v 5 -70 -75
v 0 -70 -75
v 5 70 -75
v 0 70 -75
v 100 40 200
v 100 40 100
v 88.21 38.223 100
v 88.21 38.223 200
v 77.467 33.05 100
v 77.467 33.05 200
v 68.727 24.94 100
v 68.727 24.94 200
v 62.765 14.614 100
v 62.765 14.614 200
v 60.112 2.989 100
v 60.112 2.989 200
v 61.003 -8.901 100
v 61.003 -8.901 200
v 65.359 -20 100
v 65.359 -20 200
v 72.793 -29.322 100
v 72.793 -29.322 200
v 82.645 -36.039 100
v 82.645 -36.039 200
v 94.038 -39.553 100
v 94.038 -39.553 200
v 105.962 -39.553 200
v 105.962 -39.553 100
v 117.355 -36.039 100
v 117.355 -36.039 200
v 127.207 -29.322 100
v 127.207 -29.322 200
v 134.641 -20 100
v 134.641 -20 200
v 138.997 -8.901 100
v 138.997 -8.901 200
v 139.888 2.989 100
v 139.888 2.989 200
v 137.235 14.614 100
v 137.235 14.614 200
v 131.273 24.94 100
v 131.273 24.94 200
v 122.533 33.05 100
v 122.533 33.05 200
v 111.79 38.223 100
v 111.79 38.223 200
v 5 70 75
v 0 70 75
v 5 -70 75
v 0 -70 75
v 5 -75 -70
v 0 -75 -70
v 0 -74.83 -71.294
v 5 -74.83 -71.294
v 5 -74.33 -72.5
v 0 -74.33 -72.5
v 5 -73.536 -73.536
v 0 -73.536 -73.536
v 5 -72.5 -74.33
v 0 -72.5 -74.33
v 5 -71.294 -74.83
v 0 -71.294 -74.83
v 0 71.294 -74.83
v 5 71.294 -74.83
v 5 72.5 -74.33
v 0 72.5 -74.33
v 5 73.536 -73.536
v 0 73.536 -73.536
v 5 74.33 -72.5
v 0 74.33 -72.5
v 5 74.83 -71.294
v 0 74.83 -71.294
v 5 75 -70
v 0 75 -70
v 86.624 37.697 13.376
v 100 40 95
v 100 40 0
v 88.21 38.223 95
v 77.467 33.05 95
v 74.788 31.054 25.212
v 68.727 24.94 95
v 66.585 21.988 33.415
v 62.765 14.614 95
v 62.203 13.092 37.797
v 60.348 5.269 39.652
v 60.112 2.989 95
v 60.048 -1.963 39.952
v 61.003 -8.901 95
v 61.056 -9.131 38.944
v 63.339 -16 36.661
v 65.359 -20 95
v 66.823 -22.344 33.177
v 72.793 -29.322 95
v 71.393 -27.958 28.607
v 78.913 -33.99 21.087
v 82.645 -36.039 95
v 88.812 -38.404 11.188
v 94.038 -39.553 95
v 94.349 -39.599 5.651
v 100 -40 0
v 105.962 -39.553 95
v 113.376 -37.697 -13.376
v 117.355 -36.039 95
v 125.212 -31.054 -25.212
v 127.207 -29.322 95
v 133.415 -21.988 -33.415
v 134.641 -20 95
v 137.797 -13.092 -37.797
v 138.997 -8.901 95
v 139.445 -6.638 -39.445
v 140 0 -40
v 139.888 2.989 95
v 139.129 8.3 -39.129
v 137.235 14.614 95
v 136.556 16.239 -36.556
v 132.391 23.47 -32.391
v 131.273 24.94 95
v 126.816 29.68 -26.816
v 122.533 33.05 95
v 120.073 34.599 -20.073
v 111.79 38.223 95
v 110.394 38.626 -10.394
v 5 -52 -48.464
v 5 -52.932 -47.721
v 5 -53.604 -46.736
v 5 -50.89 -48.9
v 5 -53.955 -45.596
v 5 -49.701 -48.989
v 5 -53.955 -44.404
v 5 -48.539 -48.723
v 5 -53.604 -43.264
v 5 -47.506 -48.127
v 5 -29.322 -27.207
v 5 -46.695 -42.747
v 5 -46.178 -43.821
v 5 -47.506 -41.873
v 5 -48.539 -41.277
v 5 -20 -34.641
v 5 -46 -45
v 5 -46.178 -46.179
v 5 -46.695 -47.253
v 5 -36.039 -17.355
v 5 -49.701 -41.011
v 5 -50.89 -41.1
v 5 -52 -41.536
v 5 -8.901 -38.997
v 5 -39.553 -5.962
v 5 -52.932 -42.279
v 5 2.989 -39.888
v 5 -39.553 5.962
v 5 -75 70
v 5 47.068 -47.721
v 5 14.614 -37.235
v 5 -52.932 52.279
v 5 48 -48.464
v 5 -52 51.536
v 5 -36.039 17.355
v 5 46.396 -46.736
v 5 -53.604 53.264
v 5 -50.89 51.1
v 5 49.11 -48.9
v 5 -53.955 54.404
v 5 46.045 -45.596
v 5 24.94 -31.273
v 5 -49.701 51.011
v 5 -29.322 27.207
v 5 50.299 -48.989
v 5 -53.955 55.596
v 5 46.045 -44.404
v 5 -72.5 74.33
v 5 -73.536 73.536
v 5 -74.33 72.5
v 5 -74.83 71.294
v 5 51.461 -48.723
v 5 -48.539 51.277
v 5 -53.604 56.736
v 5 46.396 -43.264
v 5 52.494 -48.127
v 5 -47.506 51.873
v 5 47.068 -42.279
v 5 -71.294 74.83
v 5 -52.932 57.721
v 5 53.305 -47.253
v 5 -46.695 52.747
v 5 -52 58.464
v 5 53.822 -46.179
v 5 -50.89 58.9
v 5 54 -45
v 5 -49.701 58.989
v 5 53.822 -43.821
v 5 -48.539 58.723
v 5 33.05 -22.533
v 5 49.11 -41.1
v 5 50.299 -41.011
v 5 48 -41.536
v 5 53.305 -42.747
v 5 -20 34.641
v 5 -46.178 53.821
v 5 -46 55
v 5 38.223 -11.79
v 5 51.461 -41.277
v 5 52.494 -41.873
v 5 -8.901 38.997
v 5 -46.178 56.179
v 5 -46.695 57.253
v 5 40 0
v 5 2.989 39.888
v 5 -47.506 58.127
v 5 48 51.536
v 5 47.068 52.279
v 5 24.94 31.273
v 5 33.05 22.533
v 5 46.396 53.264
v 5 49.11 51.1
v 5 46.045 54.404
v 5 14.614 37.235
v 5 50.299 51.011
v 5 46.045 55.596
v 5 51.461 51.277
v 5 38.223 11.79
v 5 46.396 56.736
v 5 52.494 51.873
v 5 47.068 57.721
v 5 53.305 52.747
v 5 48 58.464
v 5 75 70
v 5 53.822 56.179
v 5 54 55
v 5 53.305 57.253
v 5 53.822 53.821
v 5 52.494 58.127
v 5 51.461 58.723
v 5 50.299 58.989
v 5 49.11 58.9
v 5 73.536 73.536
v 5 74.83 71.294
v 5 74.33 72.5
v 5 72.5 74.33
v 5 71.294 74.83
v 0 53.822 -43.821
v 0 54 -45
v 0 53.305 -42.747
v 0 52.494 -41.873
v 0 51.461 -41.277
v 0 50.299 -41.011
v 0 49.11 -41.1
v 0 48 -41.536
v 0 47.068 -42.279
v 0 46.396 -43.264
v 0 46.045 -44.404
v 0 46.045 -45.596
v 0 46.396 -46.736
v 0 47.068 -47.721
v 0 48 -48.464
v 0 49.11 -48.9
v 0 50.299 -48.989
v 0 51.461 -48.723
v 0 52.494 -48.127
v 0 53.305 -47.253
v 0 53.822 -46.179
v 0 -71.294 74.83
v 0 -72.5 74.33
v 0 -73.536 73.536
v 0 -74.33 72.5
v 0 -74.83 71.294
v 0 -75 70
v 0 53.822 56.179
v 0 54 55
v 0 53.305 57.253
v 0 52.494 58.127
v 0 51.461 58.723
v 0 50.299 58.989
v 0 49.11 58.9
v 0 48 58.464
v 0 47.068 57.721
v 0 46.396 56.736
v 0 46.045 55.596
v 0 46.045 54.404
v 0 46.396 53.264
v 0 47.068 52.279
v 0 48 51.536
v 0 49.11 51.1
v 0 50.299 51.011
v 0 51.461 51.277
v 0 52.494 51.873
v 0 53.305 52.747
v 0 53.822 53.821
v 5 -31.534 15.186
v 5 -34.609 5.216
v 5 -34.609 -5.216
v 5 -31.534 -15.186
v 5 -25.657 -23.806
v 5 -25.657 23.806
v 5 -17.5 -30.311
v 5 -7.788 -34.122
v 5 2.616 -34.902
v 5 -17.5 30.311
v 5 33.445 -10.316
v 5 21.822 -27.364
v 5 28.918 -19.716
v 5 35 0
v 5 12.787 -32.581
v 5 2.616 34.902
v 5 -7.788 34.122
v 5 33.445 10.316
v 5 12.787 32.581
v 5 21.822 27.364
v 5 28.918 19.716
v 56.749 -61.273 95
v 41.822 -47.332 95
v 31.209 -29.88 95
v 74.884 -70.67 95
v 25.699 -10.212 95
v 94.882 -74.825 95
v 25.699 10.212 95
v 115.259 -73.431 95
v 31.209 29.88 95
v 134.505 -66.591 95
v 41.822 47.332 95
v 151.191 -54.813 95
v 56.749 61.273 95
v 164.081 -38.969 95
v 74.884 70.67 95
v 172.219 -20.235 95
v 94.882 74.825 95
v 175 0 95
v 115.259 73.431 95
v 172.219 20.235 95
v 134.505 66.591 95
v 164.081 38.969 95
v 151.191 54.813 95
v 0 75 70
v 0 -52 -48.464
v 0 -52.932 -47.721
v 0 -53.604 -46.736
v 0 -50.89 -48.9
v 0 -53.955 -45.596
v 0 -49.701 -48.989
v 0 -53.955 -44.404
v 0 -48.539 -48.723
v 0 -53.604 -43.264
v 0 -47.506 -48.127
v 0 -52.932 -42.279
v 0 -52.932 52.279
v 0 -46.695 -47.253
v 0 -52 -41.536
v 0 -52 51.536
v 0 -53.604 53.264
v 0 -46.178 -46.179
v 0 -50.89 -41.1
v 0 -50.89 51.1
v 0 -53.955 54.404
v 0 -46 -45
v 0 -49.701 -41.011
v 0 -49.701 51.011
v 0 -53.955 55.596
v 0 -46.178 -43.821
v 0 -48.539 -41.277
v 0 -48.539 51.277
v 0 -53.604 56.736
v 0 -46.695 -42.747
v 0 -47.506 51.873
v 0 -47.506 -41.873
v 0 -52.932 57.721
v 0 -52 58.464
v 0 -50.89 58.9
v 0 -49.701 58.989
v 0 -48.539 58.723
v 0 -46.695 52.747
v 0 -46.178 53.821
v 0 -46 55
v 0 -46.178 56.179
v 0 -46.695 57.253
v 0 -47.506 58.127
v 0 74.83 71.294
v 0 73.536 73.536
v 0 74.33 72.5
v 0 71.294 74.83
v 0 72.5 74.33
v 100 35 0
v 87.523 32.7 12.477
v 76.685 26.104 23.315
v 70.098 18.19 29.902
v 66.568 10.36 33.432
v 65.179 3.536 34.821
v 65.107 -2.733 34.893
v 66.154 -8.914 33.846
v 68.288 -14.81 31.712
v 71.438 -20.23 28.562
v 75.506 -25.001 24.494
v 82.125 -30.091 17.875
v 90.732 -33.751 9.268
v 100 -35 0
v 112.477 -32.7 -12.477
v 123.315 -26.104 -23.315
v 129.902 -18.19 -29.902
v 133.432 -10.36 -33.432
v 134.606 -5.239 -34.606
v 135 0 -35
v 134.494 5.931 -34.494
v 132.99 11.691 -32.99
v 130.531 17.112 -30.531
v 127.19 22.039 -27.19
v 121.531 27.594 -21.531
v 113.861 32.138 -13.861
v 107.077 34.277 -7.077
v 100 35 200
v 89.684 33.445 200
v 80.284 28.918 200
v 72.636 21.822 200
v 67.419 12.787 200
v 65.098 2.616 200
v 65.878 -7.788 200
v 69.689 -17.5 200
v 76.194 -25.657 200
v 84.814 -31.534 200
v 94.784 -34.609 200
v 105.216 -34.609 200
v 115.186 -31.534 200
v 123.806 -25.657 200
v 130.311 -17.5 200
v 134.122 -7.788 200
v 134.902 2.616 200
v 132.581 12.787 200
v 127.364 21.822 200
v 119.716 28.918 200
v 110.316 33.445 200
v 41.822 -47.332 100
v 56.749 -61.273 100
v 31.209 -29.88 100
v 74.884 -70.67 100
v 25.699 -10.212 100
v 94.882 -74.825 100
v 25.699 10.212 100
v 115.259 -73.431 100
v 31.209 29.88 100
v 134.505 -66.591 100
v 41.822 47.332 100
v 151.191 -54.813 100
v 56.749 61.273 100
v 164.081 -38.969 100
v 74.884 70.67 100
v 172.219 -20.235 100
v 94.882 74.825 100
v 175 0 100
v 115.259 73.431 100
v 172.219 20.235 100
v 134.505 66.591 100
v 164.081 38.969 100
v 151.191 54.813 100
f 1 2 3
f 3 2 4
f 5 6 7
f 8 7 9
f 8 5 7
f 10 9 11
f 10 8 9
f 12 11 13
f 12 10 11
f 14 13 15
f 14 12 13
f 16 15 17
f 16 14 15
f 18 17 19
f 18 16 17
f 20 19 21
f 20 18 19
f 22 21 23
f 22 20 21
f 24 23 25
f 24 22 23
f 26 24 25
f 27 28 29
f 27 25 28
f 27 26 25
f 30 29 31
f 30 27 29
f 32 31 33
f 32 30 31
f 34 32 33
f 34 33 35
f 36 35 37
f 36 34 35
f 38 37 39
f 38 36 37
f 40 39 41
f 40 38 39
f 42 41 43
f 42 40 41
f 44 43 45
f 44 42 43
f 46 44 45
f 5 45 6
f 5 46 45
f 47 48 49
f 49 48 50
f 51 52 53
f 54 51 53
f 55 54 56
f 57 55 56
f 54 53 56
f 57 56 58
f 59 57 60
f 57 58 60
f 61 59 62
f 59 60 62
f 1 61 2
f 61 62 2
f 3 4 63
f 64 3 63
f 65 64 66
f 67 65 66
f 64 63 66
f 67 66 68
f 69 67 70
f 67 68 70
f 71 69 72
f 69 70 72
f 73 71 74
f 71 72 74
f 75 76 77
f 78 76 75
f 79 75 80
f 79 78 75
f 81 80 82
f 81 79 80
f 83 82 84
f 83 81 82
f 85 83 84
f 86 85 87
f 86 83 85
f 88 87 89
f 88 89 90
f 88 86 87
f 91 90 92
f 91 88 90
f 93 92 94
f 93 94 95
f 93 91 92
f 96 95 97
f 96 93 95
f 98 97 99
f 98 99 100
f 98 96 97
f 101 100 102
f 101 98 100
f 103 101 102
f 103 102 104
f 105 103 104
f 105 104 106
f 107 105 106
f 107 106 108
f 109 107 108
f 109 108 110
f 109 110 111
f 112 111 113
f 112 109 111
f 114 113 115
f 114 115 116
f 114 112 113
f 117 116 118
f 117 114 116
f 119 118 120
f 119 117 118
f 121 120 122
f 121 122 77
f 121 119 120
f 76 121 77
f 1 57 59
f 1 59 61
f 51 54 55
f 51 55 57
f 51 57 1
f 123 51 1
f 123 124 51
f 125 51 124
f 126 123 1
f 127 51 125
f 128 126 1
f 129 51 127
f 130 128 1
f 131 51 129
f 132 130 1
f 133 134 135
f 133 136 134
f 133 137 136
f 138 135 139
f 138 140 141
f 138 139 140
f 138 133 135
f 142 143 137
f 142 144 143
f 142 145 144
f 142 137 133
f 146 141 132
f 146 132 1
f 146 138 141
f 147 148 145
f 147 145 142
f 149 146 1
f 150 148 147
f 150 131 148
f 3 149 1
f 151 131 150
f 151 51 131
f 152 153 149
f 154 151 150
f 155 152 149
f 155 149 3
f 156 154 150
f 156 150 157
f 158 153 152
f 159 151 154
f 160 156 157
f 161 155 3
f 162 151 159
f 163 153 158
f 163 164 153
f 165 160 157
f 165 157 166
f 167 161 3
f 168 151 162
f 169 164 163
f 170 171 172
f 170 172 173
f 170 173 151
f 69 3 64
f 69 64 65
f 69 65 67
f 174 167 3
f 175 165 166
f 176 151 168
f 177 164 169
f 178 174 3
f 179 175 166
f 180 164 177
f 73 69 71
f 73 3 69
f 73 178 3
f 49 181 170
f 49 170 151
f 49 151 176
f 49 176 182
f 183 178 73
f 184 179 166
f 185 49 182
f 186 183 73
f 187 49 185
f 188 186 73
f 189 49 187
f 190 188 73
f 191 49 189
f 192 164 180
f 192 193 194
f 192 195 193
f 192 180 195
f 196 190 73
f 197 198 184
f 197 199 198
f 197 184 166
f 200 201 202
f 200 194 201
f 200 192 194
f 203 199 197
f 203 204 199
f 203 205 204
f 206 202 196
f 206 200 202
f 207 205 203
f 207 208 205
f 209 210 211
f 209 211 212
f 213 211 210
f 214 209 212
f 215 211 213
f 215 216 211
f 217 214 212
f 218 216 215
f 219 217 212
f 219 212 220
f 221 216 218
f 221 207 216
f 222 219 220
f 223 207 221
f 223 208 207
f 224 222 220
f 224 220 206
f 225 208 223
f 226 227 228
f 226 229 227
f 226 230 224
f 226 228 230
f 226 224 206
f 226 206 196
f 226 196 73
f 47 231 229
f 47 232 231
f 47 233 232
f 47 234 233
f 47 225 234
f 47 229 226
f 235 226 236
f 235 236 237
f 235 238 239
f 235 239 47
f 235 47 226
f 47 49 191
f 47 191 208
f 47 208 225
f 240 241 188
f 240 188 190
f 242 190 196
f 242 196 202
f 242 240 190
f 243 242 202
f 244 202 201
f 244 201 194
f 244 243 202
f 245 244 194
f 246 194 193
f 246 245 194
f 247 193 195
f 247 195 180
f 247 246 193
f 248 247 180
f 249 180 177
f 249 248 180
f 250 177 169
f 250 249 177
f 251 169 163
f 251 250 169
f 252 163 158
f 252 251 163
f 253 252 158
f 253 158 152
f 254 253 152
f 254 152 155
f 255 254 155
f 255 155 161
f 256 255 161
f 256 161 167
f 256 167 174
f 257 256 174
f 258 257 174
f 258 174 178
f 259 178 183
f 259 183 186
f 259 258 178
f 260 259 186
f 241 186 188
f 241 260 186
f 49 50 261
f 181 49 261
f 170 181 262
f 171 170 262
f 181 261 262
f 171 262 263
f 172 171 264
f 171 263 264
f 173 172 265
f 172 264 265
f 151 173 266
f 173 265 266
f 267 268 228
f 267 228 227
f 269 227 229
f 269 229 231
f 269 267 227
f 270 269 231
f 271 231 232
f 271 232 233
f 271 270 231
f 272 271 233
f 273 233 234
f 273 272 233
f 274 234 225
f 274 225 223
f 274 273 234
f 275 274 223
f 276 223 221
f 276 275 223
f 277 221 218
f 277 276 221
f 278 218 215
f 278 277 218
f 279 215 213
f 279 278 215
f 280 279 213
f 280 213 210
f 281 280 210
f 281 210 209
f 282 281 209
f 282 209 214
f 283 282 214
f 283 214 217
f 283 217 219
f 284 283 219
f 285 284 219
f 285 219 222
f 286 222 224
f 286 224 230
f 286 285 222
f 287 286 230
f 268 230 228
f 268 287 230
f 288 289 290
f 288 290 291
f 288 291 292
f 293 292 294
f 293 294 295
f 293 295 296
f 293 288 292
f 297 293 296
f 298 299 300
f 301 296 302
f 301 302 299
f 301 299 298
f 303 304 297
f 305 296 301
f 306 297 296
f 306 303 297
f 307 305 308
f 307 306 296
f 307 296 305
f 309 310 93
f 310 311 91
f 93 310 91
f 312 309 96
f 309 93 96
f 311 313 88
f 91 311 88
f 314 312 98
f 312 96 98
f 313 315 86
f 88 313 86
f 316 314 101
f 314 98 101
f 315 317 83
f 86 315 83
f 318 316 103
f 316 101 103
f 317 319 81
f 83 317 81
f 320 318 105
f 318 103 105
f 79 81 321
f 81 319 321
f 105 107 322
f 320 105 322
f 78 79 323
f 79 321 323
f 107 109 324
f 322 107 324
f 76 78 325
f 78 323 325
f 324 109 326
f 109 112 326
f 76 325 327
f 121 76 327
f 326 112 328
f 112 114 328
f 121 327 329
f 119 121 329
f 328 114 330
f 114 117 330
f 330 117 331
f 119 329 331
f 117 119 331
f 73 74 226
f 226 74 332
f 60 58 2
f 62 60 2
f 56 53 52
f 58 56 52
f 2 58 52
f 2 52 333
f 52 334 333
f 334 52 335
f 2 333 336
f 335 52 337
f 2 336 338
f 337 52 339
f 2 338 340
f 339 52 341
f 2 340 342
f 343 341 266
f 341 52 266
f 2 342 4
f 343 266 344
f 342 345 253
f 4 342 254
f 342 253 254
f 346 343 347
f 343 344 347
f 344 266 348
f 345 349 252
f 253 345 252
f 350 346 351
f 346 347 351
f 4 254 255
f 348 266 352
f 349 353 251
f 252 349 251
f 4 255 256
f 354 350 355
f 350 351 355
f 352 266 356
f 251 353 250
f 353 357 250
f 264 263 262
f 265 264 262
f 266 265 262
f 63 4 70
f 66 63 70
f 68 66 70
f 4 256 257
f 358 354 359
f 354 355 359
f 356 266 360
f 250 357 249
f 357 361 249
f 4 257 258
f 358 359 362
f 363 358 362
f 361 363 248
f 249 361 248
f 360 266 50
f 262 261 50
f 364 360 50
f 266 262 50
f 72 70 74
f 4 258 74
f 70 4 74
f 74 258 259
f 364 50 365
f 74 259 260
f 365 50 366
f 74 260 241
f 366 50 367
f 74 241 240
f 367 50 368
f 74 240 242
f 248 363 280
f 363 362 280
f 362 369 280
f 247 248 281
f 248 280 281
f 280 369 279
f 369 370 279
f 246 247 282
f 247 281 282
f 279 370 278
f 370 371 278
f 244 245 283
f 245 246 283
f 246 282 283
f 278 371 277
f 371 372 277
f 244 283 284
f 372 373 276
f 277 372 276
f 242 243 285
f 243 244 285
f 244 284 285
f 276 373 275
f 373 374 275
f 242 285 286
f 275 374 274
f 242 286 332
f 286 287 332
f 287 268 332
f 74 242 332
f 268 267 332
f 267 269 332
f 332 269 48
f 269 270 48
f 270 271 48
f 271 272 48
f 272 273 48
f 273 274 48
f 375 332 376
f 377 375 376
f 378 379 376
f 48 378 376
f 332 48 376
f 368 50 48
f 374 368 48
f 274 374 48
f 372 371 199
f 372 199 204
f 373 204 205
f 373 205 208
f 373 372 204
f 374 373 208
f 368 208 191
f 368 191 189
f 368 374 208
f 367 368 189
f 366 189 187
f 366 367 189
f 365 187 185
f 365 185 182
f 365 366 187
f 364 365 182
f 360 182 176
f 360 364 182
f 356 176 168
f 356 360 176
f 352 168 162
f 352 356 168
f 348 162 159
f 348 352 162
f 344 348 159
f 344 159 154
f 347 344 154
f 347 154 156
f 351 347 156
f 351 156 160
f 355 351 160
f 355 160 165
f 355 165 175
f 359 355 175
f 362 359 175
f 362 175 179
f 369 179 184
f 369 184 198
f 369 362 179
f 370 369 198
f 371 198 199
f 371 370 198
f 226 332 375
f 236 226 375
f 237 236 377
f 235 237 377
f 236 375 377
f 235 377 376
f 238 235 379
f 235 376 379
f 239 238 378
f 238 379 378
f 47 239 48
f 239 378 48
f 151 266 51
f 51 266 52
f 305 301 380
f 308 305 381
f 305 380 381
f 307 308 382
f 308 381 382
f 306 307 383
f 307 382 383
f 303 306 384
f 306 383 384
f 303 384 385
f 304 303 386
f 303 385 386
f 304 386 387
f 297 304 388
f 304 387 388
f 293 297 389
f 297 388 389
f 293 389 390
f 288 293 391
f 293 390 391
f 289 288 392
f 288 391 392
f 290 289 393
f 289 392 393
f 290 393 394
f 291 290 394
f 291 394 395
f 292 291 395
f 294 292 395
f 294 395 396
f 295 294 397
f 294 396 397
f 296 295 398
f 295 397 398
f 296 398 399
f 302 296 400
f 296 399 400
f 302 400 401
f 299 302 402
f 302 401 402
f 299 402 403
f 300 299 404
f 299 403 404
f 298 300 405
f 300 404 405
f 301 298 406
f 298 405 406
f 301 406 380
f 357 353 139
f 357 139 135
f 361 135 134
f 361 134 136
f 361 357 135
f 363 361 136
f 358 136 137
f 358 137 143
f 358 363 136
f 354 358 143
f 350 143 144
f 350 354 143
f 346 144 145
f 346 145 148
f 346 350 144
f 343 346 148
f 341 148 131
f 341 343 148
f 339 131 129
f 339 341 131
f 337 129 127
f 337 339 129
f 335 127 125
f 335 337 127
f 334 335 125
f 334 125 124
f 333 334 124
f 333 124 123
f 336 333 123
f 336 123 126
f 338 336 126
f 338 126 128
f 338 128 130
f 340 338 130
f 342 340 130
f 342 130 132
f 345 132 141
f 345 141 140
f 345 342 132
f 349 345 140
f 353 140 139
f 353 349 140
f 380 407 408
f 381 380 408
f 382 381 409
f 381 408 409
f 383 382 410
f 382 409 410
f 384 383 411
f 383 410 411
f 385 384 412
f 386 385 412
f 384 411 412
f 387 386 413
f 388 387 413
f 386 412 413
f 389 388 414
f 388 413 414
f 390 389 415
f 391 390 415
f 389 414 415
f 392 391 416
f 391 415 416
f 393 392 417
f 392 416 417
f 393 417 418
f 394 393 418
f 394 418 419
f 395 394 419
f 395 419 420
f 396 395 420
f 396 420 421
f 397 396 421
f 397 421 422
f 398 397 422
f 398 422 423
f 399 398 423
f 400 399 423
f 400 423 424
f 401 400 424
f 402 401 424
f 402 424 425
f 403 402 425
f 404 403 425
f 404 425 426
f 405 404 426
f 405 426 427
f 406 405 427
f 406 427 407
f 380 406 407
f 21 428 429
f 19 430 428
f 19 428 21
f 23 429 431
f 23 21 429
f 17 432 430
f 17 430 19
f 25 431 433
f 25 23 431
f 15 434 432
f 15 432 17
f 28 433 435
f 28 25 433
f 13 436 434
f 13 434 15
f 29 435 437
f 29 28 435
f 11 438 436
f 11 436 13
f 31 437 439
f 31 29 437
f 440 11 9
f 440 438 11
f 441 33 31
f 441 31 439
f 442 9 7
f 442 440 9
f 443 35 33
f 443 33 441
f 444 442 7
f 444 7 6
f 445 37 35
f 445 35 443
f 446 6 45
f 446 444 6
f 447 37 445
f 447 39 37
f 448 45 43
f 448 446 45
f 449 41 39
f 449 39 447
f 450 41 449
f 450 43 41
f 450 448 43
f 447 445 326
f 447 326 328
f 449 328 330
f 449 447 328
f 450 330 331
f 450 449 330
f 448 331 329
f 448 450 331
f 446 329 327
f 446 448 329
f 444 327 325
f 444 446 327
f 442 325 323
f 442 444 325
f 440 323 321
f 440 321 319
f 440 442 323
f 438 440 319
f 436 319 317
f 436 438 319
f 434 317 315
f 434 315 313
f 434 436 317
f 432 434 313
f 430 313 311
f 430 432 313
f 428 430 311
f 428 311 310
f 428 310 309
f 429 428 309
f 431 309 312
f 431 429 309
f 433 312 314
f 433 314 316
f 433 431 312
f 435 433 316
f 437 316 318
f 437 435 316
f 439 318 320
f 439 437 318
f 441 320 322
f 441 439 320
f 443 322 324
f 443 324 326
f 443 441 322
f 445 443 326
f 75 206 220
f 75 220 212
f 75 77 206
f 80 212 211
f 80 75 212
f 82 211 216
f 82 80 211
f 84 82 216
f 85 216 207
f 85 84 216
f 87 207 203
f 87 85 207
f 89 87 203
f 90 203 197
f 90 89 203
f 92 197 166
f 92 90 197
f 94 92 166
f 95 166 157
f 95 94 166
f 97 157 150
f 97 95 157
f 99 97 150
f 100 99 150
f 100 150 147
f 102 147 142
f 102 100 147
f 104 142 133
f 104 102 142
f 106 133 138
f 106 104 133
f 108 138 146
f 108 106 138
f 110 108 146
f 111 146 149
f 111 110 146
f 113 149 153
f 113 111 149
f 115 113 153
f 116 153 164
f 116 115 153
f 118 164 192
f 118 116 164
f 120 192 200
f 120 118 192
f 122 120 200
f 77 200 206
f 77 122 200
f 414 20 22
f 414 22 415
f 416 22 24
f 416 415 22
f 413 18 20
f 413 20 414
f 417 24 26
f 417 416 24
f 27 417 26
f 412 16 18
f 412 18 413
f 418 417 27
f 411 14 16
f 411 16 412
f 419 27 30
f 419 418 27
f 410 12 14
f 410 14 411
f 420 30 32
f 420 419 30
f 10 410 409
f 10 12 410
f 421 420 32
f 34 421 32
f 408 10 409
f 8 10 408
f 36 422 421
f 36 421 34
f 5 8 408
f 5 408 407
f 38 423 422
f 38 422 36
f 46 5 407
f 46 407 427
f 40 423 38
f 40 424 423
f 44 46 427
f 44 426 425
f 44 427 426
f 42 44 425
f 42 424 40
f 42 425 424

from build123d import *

# Parameters (mm, degrees)
F0_R     = 40
F0_R_2   = 34.9999991059
F5_R     = 75
F5_R_2   = 40
F6_DEPTH = 5
F2_R     = 4
F7_DEPTH = 5


with BuildPart() as f3:
    # F3: sweep along a path in F1
    with BuildLine(Plane.XZ) as f3_path:
        Line((0, 0), (100, 0))
        Line((100, 0), (100, 200))
    # F0 (on Right) → F3 (sweep)
    with BuildSketch(Plane.YZ):
        Circle(F0_R)
        Circle(F0_R_2, mode=Mode.SUBTRACT)
    sweep(path=f3_path.line, transition=Transition.RIGHT)

    # F5 (on face) → F6 (join)
    with BuildSketch(Plane.XY.offset(100)):
        with Locations((100, 0)):
            Circle(F5_R)
        with Locations((100, 0)):
            Circle(F5_R_2, mode=Mode.SUBTRACT)
    extrude(amount=-F6_DEPTH)

    # F2 (on Right) → F7 (join)
    with BuildSketch(Plane.YZ):
        with BuildLine():
            Line((-70, -75), (70, -75))
            ThreePointArc((70, -75), (73.5355339059, -73.5355339059), (75, -70))
            Line((75, -70), (75, 70))
            ThreePointArc((75, 70), (73.5355339059, 73.5355339059), (70, 75))
            Line((70, 75), (-70, 75))
            ThreePointArc((-70, 75), (-73.5355339059, 73.5355339059), (-75, 70))
            Line((-75, 70), (-75, -70))
            ThreePointArc((-75, -70), (-73.5355339059, -73.5355339059), (-70, -75))
        make_face()
        with Locations((-50, -45)):
            Circle(F2_R, mode=Mode.SUBTRACT)
        with Locations((50, -45)):
            Circle(F2_R, mode=Mode.SUBTRACT)
        with Locations((-50, 55)):
            Circle(F2_R, mode=Mode.SUBTRACT)
        with Locations((50, 55)):
            Circle(F2_R, mode=Mode.SUBTRACT)
    extrude(amount=F7_DEPTH)


solid = f3.part
